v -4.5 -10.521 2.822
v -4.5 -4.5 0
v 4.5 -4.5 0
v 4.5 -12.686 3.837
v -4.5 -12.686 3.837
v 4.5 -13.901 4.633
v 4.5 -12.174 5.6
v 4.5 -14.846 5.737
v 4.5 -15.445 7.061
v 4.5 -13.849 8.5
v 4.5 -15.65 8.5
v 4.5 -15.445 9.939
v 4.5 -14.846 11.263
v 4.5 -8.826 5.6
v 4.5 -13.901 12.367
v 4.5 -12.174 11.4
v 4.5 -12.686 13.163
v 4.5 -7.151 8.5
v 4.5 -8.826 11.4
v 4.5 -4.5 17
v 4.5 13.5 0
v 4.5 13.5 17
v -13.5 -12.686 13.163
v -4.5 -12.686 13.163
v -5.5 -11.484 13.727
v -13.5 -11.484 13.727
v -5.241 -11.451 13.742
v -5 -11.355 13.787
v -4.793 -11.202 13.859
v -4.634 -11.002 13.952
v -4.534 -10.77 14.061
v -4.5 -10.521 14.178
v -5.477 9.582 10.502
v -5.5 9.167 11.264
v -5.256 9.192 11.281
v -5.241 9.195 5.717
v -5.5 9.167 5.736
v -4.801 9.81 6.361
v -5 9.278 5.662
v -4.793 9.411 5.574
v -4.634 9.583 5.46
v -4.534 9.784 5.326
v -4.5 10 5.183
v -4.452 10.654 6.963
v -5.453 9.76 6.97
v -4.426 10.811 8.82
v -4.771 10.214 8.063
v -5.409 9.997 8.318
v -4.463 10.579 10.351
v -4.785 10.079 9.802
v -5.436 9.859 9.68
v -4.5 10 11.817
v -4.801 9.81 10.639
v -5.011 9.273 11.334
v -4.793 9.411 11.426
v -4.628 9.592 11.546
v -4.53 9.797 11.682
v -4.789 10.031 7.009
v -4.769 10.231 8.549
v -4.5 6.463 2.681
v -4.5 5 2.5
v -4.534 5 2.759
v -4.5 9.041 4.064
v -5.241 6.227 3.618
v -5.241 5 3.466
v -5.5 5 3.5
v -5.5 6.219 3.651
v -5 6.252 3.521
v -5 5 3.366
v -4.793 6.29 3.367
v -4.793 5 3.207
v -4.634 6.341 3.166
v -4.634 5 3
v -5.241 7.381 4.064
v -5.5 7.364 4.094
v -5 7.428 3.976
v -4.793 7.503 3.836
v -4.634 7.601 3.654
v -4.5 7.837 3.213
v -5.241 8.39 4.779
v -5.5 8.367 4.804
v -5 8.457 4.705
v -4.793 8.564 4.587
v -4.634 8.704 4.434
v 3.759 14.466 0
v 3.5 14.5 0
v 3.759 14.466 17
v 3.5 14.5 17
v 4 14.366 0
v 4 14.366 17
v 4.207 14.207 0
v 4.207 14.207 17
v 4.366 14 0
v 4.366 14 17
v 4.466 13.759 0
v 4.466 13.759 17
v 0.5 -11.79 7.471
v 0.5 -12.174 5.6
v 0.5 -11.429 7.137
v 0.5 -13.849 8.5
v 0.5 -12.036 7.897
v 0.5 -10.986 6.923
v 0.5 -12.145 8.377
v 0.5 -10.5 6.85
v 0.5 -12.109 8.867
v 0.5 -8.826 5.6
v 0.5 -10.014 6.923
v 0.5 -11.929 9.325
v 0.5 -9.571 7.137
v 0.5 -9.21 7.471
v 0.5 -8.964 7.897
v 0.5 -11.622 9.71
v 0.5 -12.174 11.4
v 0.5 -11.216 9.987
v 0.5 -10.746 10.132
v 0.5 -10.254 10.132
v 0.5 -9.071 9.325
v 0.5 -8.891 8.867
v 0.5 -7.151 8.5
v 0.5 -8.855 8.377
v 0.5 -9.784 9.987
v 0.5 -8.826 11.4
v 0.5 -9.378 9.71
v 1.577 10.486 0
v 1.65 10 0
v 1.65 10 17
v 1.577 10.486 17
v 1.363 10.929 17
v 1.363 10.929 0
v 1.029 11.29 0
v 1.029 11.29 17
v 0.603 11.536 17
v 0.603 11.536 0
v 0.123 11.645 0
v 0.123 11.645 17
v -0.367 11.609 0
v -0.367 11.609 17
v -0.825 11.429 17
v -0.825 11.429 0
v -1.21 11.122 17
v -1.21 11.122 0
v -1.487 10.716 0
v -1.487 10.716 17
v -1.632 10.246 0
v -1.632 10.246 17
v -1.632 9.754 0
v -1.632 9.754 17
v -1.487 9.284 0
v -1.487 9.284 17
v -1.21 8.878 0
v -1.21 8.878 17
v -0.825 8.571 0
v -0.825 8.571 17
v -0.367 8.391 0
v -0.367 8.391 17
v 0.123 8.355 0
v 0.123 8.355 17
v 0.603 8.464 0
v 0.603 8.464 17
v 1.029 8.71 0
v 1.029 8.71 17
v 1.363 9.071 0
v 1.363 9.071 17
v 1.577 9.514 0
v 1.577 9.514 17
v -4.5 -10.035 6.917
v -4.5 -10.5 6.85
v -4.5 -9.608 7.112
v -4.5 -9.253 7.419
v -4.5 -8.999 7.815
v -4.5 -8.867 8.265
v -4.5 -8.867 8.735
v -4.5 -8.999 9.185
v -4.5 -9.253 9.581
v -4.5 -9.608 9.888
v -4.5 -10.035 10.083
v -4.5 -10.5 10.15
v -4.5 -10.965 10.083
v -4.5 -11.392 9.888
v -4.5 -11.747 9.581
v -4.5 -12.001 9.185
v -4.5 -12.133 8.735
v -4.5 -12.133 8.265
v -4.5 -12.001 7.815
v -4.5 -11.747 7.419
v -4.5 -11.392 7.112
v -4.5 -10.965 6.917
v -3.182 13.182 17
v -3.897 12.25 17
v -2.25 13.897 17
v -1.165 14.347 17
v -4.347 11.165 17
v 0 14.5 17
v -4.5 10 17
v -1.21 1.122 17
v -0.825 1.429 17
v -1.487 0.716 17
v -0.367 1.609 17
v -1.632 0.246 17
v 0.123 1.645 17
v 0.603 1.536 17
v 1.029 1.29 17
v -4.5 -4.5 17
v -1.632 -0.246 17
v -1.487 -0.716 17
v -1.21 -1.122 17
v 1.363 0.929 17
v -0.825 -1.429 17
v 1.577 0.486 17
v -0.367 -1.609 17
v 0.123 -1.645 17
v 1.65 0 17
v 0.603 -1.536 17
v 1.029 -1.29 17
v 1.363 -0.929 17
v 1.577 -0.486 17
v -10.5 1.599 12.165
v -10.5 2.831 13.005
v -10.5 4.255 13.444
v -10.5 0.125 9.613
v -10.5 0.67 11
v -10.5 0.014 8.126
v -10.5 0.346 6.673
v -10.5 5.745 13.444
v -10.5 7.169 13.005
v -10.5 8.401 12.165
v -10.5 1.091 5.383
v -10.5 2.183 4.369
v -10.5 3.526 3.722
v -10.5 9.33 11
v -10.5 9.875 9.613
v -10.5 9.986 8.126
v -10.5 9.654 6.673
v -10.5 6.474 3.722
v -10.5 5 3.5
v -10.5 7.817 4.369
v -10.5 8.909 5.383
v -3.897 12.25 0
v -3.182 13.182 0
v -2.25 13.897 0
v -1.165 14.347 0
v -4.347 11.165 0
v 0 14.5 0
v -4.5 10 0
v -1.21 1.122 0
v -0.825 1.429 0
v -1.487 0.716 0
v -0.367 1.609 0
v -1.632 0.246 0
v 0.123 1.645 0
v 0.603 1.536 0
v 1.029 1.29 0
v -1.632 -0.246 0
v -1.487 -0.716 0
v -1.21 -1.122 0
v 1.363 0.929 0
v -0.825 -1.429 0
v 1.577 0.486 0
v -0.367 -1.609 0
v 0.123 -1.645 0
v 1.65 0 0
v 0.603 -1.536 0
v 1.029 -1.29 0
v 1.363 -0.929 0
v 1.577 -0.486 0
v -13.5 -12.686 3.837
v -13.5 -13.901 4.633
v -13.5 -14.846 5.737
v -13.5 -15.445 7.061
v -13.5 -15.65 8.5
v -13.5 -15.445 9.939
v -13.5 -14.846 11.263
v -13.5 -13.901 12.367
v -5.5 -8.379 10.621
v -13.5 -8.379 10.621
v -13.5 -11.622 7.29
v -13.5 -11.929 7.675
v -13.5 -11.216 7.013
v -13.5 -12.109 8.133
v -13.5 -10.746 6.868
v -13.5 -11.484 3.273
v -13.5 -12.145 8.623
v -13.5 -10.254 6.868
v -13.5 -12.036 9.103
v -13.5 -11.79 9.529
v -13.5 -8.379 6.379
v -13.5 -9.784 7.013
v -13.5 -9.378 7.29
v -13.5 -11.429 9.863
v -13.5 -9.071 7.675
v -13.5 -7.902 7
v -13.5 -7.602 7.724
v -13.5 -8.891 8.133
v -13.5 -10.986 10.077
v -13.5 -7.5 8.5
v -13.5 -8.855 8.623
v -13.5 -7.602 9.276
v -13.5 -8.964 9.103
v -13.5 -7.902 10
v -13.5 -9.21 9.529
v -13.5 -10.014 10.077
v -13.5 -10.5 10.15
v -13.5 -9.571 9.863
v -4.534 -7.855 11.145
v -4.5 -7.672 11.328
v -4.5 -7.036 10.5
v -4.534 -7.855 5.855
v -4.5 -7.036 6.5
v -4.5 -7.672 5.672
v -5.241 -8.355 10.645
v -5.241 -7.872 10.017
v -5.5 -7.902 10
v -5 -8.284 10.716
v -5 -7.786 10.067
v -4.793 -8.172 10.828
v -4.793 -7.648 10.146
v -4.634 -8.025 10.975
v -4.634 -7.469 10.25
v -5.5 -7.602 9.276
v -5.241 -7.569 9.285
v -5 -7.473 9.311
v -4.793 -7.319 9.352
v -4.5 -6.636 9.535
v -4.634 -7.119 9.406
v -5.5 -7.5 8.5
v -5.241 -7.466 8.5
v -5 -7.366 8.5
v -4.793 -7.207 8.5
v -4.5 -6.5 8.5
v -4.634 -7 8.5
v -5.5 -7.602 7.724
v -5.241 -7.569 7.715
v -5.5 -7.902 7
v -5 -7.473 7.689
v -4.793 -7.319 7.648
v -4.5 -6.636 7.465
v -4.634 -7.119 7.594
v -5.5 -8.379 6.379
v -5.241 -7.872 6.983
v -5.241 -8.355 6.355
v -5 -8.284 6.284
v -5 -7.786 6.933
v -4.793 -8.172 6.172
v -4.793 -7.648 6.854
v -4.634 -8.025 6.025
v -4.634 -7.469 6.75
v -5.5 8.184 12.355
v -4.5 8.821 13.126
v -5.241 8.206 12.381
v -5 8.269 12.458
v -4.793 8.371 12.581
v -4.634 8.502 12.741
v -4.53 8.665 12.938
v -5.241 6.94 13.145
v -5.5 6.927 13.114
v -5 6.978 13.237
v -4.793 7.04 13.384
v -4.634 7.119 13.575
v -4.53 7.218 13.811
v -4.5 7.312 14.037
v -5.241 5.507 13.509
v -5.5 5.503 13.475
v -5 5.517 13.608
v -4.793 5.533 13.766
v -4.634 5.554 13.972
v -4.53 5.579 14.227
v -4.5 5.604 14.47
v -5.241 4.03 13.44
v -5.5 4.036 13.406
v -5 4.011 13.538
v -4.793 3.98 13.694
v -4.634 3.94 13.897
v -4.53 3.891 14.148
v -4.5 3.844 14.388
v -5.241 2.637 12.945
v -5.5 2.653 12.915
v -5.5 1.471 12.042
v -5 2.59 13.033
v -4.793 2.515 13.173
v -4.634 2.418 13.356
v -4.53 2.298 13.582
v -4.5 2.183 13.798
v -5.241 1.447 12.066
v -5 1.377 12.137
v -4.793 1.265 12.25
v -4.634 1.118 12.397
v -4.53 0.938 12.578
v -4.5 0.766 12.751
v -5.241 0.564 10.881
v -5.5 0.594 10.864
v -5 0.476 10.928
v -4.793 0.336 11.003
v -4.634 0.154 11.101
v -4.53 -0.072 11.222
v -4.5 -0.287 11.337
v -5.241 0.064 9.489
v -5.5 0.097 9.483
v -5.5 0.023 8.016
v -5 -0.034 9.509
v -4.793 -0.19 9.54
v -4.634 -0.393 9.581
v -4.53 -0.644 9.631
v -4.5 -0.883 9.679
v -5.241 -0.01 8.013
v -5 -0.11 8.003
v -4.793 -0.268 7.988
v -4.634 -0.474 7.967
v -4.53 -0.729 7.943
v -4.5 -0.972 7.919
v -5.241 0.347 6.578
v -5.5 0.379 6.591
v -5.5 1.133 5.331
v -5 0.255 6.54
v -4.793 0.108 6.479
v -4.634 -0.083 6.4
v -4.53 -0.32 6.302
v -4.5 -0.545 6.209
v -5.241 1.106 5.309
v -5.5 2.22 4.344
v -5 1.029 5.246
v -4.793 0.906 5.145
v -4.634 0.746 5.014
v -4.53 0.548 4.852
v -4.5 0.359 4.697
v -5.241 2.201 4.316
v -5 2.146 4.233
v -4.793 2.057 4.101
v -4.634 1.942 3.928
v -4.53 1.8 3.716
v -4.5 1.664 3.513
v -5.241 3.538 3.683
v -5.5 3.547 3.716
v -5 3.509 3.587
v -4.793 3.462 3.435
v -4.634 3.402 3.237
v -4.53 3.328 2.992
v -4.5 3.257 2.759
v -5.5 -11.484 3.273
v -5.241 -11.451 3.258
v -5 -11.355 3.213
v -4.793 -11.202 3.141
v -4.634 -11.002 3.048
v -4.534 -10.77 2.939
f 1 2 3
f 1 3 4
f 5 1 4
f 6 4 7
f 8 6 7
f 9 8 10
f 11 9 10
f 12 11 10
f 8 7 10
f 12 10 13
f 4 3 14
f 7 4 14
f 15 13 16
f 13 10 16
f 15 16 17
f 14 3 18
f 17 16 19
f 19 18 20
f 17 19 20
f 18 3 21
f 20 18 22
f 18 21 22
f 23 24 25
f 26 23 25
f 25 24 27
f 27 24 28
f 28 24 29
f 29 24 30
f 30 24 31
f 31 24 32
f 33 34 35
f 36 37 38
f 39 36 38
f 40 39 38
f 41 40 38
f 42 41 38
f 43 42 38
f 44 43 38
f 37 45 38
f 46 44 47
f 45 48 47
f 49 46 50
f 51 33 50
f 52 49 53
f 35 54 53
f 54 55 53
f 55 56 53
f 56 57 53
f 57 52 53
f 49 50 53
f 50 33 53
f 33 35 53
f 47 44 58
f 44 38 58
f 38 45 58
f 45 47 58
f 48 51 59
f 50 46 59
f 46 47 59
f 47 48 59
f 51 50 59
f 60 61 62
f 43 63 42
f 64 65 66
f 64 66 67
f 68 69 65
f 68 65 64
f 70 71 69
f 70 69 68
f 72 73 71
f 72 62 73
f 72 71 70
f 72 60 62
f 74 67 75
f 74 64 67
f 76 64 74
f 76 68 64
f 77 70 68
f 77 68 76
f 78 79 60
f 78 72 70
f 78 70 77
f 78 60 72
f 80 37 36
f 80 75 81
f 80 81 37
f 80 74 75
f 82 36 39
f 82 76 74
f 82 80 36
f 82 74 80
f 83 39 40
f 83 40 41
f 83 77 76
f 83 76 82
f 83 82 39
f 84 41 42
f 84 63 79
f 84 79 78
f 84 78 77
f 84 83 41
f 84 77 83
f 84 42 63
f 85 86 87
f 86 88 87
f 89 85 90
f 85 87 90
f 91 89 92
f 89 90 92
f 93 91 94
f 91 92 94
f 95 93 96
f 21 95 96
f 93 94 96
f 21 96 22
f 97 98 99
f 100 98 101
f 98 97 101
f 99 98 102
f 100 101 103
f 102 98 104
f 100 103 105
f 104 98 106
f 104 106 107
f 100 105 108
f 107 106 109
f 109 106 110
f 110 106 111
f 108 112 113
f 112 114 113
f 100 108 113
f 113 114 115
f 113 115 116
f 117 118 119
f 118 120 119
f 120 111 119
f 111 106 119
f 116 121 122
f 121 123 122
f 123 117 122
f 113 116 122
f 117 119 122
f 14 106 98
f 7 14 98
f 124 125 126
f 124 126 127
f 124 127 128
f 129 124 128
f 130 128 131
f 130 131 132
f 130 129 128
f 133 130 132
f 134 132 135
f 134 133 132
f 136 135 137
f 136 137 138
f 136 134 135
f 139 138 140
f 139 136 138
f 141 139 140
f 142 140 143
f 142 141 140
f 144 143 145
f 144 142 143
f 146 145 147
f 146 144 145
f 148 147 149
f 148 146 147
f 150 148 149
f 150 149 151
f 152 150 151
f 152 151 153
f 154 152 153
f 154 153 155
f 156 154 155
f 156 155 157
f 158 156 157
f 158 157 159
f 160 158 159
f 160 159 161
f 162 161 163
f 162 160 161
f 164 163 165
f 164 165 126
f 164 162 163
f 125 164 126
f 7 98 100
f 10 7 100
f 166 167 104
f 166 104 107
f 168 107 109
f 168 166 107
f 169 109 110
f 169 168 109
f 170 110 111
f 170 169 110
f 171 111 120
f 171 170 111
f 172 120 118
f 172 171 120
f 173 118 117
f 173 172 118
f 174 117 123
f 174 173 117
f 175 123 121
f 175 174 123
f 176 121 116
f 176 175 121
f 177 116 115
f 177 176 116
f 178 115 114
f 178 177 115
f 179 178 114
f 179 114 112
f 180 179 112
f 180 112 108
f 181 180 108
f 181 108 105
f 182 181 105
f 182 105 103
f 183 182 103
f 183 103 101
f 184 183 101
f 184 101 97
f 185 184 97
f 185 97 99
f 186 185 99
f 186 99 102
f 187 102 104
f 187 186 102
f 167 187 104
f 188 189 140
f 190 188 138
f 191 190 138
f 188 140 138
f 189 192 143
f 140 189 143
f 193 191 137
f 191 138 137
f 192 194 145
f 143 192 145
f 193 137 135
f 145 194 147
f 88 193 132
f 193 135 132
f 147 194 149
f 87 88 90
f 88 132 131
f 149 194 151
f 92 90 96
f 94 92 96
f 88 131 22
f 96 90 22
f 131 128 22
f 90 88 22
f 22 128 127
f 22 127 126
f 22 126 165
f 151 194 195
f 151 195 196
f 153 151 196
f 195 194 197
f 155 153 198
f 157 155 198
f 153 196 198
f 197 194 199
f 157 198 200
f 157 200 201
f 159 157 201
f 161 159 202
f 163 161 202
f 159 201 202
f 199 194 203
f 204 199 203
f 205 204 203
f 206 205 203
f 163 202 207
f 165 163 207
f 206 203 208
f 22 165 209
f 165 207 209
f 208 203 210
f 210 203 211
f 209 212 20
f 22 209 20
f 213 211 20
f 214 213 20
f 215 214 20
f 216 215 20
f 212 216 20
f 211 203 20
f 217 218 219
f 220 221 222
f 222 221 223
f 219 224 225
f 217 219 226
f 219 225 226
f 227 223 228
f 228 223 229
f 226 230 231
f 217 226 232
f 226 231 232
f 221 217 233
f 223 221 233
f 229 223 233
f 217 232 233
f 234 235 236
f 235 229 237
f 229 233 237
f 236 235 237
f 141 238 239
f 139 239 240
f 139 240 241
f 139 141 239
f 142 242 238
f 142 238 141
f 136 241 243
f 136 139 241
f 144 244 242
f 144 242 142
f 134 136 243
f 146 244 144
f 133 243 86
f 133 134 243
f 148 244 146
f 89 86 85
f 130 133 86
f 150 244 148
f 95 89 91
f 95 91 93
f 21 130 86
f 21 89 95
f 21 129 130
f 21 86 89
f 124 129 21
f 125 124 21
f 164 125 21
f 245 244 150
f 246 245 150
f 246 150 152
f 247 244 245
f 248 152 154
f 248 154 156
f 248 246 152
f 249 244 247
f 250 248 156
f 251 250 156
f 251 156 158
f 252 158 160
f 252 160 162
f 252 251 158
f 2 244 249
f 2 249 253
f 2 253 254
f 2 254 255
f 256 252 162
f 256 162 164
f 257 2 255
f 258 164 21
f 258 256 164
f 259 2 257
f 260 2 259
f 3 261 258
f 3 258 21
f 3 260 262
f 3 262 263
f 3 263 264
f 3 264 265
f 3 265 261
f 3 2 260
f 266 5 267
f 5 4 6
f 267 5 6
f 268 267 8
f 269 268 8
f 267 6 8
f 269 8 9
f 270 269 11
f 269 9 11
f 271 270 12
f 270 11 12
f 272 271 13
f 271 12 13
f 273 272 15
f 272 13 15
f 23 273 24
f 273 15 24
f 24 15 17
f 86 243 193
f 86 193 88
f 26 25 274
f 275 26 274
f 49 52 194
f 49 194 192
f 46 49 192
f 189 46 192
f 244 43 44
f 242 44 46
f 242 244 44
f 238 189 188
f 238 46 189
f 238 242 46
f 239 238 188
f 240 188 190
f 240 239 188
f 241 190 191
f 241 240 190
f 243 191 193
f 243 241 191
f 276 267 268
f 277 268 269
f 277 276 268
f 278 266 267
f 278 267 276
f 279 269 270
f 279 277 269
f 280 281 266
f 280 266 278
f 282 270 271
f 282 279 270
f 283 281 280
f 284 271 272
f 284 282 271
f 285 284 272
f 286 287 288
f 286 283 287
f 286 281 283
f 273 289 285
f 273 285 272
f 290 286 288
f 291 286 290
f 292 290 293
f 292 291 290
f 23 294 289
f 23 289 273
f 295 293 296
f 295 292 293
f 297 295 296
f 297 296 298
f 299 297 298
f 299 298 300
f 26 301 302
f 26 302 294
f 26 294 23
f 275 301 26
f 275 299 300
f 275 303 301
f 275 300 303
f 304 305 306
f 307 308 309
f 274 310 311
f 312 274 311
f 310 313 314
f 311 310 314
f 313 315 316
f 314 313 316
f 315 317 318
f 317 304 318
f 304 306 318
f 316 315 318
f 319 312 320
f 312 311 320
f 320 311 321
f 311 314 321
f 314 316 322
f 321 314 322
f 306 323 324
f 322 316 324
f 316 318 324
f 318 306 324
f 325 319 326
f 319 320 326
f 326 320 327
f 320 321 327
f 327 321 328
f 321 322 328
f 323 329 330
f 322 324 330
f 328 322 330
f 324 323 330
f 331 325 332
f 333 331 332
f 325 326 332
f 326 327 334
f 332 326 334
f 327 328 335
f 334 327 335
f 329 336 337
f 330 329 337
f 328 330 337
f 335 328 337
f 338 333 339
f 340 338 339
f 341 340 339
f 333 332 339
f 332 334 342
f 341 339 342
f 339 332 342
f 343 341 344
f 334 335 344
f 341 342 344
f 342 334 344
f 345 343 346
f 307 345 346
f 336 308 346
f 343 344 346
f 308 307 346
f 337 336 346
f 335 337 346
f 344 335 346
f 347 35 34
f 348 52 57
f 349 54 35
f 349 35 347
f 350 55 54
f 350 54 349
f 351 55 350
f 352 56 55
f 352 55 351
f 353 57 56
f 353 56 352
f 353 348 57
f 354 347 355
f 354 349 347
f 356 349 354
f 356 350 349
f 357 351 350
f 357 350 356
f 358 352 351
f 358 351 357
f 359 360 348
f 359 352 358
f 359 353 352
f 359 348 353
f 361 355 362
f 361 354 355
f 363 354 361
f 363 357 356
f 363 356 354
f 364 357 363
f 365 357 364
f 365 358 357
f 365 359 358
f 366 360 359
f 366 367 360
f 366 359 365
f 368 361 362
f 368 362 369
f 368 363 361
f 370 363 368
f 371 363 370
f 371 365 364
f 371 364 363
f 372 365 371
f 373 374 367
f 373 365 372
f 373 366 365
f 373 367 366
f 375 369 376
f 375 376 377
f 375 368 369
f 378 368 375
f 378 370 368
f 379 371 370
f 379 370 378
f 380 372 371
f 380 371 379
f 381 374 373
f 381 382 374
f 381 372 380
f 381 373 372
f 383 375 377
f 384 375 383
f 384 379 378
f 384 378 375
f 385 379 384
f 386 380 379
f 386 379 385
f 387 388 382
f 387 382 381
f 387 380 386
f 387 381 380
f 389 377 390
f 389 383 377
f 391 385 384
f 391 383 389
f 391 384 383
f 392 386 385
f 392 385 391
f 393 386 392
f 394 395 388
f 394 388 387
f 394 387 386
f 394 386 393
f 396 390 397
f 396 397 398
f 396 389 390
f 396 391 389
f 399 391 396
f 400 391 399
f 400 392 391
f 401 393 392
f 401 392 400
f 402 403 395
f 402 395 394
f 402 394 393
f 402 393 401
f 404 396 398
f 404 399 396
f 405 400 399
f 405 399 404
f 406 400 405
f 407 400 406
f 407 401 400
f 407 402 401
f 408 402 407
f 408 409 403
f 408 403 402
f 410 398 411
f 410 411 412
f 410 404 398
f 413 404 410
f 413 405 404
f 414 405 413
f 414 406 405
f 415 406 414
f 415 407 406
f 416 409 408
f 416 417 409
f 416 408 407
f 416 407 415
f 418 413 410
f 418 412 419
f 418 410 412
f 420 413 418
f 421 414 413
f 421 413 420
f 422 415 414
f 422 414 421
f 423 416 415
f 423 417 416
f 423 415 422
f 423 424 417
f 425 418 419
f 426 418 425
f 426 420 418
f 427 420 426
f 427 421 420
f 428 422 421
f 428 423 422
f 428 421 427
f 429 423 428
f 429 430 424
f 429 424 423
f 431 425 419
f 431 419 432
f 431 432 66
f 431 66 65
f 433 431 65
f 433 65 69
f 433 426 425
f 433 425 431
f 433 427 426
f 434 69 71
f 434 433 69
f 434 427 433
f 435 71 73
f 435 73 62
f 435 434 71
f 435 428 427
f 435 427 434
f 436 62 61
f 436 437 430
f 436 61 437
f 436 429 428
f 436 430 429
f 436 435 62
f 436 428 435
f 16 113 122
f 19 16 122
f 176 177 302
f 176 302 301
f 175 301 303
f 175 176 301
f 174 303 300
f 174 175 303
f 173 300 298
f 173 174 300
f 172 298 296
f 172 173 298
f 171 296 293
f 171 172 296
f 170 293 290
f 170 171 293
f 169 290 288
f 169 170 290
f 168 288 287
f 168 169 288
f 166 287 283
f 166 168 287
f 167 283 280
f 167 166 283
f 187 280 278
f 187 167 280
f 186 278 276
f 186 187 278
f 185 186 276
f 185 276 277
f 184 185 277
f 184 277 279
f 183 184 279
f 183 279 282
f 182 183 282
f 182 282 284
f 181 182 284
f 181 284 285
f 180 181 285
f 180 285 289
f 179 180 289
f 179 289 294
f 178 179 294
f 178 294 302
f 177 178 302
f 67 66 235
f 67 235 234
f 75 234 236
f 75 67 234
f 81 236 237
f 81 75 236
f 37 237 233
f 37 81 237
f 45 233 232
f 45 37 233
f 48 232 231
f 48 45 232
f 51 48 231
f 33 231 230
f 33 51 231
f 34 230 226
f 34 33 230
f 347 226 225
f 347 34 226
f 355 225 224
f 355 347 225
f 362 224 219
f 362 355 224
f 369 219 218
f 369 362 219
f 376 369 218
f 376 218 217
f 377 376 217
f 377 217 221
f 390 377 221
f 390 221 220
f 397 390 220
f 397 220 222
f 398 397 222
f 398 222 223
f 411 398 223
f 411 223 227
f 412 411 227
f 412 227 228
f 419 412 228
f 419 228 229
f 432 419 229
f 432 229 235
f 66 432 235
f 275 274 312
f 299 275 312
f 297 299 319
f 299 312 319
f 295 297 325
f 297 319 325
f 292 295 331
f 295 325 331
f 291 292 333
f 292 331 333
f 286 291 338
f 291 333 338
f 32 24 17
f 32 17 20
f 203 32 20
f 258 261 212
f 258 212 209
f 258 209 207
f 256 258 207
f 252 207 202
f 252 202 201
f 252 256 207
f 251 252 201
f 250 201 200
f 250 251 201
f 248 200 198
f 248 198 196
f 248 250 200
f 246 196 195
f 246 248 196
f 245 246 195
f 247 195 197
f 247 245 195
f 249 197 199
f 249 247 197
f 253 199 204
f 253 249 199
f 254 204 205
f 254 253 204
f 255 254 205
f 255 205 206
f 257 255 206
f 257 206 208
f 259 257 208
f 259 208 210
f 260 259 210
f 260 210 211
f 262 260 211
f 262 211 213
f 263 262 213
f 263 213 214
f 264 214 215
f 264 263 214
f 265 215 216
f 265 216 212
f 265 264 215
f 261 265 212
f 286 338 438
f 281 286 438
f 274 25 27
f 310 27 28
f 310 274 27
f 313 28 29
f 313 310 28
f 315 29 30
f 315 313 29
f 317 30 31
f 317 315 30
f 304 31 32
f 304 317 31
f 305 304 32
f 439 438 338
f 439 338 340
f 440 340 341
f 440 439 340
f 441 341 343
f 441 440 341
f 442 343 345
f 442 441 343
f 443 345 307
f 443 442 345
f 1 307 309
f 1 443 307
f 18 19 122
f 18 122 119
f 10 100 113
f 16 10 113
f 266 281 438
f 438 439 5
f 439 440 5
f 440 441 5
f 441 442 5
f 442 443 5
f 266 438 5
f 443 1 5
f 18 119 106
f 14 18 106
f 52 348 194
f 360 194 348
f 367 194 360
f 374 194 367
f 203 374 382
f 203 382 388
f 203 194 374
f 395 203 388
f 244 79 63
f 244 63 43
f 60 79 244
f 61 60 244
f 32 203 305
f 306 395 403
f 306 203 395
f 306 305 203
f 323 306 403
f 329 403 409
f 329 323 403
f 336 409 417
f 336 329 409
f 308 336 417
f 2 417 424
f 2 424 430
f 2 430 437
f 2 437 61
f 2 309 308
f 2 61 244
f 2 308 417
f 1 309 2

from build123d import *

# Parameters (mm, degrees)
SKETCH2_R           = 1.65
BOSS_EXTRUDE1_DEPTH = 17
BOSS_EXTRUDE2_START = -9
SKETCH3_R           = 1.65
BOSS_EXTRUDE2_DEPTH = 9
BOSS_EXTRUDE4_REACH = 21
SKETCH4_W           = 4.5
SKETCH4_H           = 17
CUT_EXTRUDE2_START  = -5
CUT_EXTRUDE2_DEPTH  = 13
SKETCH11_R          = 5
BOSS_EXTRUDE5_DEPTH = 6
FILLET1_R           = 1
FILLET2_R           = 1
SKETCH12_R          = 1.65
BOSS_EXTRUDE6_DEPTH = 9
FILLET3_R           = 1


with BuildPart() as part:
    # Sketch2 → Boss-Extrude1 (new body)
    with BuildSketch(Plane.XY):
        with BuildLine():
            Line((-4.5, 0), (-4.5, 10))
            ThreePointArc((-4.5, 10), (-3.181980515, 13.181980515), (0, 14.5))
            Line((0, 14.5), (4.5, 14.5))
            Line((4.5, 14.5), (4.5, -4.5))
            Line((4.5, -4.5), (0, -4.5))
            ThreePointArc((0, -4.5), (-3.181980515, -3.181980515), (-4.5, 0))
        make_face()
        with Locations((0, 10)):
            Circle(SKETCH2_R, mode=Mode.SUBTRACT)
        Circle(SKETCH2_R, mode=Mode.SUBTRACT)
    extrude(amount=BOSS_EXTRUDE1_DEPTH)

    # Sketch3 → Boss-Extrude2 (add)
    with BuildSketch(Plane(origin=(4.5, 0, 0), x_dir=(0, 0, -1), z_dir=(1, 0, 0)).offset(BOSS_EXTRUDE2_START)):
        with BuildLine():
            Line((-13.163162433, -12.685730113), (-17, -4.5))
            Line((-17, -4.5), (0, -4.5))
            Line((0, -4.5), (-3.836837567, -12.685730113))
            ThreePointArc((-3.836837567, -12.685730113), (-8.5, -15.65), (-13.163162433, -12.685730113))
        make_face()
        with Locations((-8.5, -10.5)):
            Circle(SKETCH3_R, mode=Mode.SUBTRACT)
    extrude(amount=BOSS_EXTRUDE2_DEPTH)

    # Sketch4 → Boss-Extrude4 (add, up to next)
    with BuildSketch(Plane(origin=(0, -4.5, 0), x_dir=(1, 0, 0), z_dir=(0, 1, 0)), mode=Mode.PRIVATE) as boss_extrude4_sk1:
        with Locations((-2.25, -8.5)):
            Rectangle(SKETCH4_W, SKETCH4_H)
    boss_extrude4_tool1 = extrude(boss_extrude4_sk1.sketch, amount=BOSS_EXTRUDE4_REACH, mode=Mode.PRIVATE) - part.part
    add(boss_extrude4_tool1.solids().sort_by_distance((-2.25, -4.5, 8.5))[0])

    # Sketch8 → Cut-Extrude2 (cut)
    with BuildSketch(Plane.ZY.offset(4.5).offset(CUT_EXTRUDE2_START)):
        Polygon((8.5, -7.151368439), (5.6, -8.825684219), (5.6, -12.174315781), (8.5, -13.848631561), (11.4, -12.174315781), (11.4, -8.825684219), align=None)
    extrude(amount=-CUT_EXTRUDE2_DEPTH, mode=Mode.SUBTRACT)

    # Sketch11 → Boss-Extrude5 (add)
    with BuildSketch(Plane(origin=(-4.5, 0, 0), x_dir=(0, 0, -1), z_dir=(1, 0, 0))):
        with Locations((-8.5, 5)):
            Circle(SKETCH11_R)
    extrude(amount=-BOSS_EXTRUDE5_DEPTH)

    # Fillet1
    fillet1_edges = [part.edges().sort_by_distance(p)[0] for p in [
        (-4.5, 8.535533906, 4.964466094),
    ]]
    fillet(fillet1_edges, radius=FILLET1_R)

    # Fillet2
    fillet2_edges = [part.edges().sort_by_distance(p)[0] for p in [
        (4.5, 14.5, 8.5),
    ]]
    fillet(fillet2_edges, radius=FILLET2_R)

    # Sketch12 → Boss-Extrude6 (add)
    with BuildSketch(Plane.ZY.offset(4.5)):
        with BuildLine():
            Line((13.163162433, -12.685730113), (13.726504471, -11.483863783))
            Line((13.726504471, -11.483863783), (10.621320344, -8.378679656))
            ThreePointArc((10.621320344, -8.378679656), (8.5, -7.5), (6.378679656, -8.378679656))
            Line((6.378679656, -8.378679656), (3.273495529, -11.483863783))
            Line((3.273495529, -11.483863783), (3.836837567, -12.685730113))
            ThreePointArc((3.836837567, -12.685730113), (8.5, -15.65), (13.163162433, -12.685730113))
        make_face()
        with Locations((8.5, -10.5)):
            Circle(SKETCH12_R, mode=Mode.SUBTRACT)
    extrude(amount=BOSS_EXTRUDE6_DEPTH)

    # Fillet3
    fillet3_edges = [part.edges().sort_by_distance(p)[0] for p in [
        (-4.5, -7.5, 8.5),
        (-4.5, -9.93127172, 4.826087593),
        (-4.5, -9.93127172, 12.173912407),
    ]]
    fillet(fillet3_edges, radius=FILLET3_R)


solid = part.part
